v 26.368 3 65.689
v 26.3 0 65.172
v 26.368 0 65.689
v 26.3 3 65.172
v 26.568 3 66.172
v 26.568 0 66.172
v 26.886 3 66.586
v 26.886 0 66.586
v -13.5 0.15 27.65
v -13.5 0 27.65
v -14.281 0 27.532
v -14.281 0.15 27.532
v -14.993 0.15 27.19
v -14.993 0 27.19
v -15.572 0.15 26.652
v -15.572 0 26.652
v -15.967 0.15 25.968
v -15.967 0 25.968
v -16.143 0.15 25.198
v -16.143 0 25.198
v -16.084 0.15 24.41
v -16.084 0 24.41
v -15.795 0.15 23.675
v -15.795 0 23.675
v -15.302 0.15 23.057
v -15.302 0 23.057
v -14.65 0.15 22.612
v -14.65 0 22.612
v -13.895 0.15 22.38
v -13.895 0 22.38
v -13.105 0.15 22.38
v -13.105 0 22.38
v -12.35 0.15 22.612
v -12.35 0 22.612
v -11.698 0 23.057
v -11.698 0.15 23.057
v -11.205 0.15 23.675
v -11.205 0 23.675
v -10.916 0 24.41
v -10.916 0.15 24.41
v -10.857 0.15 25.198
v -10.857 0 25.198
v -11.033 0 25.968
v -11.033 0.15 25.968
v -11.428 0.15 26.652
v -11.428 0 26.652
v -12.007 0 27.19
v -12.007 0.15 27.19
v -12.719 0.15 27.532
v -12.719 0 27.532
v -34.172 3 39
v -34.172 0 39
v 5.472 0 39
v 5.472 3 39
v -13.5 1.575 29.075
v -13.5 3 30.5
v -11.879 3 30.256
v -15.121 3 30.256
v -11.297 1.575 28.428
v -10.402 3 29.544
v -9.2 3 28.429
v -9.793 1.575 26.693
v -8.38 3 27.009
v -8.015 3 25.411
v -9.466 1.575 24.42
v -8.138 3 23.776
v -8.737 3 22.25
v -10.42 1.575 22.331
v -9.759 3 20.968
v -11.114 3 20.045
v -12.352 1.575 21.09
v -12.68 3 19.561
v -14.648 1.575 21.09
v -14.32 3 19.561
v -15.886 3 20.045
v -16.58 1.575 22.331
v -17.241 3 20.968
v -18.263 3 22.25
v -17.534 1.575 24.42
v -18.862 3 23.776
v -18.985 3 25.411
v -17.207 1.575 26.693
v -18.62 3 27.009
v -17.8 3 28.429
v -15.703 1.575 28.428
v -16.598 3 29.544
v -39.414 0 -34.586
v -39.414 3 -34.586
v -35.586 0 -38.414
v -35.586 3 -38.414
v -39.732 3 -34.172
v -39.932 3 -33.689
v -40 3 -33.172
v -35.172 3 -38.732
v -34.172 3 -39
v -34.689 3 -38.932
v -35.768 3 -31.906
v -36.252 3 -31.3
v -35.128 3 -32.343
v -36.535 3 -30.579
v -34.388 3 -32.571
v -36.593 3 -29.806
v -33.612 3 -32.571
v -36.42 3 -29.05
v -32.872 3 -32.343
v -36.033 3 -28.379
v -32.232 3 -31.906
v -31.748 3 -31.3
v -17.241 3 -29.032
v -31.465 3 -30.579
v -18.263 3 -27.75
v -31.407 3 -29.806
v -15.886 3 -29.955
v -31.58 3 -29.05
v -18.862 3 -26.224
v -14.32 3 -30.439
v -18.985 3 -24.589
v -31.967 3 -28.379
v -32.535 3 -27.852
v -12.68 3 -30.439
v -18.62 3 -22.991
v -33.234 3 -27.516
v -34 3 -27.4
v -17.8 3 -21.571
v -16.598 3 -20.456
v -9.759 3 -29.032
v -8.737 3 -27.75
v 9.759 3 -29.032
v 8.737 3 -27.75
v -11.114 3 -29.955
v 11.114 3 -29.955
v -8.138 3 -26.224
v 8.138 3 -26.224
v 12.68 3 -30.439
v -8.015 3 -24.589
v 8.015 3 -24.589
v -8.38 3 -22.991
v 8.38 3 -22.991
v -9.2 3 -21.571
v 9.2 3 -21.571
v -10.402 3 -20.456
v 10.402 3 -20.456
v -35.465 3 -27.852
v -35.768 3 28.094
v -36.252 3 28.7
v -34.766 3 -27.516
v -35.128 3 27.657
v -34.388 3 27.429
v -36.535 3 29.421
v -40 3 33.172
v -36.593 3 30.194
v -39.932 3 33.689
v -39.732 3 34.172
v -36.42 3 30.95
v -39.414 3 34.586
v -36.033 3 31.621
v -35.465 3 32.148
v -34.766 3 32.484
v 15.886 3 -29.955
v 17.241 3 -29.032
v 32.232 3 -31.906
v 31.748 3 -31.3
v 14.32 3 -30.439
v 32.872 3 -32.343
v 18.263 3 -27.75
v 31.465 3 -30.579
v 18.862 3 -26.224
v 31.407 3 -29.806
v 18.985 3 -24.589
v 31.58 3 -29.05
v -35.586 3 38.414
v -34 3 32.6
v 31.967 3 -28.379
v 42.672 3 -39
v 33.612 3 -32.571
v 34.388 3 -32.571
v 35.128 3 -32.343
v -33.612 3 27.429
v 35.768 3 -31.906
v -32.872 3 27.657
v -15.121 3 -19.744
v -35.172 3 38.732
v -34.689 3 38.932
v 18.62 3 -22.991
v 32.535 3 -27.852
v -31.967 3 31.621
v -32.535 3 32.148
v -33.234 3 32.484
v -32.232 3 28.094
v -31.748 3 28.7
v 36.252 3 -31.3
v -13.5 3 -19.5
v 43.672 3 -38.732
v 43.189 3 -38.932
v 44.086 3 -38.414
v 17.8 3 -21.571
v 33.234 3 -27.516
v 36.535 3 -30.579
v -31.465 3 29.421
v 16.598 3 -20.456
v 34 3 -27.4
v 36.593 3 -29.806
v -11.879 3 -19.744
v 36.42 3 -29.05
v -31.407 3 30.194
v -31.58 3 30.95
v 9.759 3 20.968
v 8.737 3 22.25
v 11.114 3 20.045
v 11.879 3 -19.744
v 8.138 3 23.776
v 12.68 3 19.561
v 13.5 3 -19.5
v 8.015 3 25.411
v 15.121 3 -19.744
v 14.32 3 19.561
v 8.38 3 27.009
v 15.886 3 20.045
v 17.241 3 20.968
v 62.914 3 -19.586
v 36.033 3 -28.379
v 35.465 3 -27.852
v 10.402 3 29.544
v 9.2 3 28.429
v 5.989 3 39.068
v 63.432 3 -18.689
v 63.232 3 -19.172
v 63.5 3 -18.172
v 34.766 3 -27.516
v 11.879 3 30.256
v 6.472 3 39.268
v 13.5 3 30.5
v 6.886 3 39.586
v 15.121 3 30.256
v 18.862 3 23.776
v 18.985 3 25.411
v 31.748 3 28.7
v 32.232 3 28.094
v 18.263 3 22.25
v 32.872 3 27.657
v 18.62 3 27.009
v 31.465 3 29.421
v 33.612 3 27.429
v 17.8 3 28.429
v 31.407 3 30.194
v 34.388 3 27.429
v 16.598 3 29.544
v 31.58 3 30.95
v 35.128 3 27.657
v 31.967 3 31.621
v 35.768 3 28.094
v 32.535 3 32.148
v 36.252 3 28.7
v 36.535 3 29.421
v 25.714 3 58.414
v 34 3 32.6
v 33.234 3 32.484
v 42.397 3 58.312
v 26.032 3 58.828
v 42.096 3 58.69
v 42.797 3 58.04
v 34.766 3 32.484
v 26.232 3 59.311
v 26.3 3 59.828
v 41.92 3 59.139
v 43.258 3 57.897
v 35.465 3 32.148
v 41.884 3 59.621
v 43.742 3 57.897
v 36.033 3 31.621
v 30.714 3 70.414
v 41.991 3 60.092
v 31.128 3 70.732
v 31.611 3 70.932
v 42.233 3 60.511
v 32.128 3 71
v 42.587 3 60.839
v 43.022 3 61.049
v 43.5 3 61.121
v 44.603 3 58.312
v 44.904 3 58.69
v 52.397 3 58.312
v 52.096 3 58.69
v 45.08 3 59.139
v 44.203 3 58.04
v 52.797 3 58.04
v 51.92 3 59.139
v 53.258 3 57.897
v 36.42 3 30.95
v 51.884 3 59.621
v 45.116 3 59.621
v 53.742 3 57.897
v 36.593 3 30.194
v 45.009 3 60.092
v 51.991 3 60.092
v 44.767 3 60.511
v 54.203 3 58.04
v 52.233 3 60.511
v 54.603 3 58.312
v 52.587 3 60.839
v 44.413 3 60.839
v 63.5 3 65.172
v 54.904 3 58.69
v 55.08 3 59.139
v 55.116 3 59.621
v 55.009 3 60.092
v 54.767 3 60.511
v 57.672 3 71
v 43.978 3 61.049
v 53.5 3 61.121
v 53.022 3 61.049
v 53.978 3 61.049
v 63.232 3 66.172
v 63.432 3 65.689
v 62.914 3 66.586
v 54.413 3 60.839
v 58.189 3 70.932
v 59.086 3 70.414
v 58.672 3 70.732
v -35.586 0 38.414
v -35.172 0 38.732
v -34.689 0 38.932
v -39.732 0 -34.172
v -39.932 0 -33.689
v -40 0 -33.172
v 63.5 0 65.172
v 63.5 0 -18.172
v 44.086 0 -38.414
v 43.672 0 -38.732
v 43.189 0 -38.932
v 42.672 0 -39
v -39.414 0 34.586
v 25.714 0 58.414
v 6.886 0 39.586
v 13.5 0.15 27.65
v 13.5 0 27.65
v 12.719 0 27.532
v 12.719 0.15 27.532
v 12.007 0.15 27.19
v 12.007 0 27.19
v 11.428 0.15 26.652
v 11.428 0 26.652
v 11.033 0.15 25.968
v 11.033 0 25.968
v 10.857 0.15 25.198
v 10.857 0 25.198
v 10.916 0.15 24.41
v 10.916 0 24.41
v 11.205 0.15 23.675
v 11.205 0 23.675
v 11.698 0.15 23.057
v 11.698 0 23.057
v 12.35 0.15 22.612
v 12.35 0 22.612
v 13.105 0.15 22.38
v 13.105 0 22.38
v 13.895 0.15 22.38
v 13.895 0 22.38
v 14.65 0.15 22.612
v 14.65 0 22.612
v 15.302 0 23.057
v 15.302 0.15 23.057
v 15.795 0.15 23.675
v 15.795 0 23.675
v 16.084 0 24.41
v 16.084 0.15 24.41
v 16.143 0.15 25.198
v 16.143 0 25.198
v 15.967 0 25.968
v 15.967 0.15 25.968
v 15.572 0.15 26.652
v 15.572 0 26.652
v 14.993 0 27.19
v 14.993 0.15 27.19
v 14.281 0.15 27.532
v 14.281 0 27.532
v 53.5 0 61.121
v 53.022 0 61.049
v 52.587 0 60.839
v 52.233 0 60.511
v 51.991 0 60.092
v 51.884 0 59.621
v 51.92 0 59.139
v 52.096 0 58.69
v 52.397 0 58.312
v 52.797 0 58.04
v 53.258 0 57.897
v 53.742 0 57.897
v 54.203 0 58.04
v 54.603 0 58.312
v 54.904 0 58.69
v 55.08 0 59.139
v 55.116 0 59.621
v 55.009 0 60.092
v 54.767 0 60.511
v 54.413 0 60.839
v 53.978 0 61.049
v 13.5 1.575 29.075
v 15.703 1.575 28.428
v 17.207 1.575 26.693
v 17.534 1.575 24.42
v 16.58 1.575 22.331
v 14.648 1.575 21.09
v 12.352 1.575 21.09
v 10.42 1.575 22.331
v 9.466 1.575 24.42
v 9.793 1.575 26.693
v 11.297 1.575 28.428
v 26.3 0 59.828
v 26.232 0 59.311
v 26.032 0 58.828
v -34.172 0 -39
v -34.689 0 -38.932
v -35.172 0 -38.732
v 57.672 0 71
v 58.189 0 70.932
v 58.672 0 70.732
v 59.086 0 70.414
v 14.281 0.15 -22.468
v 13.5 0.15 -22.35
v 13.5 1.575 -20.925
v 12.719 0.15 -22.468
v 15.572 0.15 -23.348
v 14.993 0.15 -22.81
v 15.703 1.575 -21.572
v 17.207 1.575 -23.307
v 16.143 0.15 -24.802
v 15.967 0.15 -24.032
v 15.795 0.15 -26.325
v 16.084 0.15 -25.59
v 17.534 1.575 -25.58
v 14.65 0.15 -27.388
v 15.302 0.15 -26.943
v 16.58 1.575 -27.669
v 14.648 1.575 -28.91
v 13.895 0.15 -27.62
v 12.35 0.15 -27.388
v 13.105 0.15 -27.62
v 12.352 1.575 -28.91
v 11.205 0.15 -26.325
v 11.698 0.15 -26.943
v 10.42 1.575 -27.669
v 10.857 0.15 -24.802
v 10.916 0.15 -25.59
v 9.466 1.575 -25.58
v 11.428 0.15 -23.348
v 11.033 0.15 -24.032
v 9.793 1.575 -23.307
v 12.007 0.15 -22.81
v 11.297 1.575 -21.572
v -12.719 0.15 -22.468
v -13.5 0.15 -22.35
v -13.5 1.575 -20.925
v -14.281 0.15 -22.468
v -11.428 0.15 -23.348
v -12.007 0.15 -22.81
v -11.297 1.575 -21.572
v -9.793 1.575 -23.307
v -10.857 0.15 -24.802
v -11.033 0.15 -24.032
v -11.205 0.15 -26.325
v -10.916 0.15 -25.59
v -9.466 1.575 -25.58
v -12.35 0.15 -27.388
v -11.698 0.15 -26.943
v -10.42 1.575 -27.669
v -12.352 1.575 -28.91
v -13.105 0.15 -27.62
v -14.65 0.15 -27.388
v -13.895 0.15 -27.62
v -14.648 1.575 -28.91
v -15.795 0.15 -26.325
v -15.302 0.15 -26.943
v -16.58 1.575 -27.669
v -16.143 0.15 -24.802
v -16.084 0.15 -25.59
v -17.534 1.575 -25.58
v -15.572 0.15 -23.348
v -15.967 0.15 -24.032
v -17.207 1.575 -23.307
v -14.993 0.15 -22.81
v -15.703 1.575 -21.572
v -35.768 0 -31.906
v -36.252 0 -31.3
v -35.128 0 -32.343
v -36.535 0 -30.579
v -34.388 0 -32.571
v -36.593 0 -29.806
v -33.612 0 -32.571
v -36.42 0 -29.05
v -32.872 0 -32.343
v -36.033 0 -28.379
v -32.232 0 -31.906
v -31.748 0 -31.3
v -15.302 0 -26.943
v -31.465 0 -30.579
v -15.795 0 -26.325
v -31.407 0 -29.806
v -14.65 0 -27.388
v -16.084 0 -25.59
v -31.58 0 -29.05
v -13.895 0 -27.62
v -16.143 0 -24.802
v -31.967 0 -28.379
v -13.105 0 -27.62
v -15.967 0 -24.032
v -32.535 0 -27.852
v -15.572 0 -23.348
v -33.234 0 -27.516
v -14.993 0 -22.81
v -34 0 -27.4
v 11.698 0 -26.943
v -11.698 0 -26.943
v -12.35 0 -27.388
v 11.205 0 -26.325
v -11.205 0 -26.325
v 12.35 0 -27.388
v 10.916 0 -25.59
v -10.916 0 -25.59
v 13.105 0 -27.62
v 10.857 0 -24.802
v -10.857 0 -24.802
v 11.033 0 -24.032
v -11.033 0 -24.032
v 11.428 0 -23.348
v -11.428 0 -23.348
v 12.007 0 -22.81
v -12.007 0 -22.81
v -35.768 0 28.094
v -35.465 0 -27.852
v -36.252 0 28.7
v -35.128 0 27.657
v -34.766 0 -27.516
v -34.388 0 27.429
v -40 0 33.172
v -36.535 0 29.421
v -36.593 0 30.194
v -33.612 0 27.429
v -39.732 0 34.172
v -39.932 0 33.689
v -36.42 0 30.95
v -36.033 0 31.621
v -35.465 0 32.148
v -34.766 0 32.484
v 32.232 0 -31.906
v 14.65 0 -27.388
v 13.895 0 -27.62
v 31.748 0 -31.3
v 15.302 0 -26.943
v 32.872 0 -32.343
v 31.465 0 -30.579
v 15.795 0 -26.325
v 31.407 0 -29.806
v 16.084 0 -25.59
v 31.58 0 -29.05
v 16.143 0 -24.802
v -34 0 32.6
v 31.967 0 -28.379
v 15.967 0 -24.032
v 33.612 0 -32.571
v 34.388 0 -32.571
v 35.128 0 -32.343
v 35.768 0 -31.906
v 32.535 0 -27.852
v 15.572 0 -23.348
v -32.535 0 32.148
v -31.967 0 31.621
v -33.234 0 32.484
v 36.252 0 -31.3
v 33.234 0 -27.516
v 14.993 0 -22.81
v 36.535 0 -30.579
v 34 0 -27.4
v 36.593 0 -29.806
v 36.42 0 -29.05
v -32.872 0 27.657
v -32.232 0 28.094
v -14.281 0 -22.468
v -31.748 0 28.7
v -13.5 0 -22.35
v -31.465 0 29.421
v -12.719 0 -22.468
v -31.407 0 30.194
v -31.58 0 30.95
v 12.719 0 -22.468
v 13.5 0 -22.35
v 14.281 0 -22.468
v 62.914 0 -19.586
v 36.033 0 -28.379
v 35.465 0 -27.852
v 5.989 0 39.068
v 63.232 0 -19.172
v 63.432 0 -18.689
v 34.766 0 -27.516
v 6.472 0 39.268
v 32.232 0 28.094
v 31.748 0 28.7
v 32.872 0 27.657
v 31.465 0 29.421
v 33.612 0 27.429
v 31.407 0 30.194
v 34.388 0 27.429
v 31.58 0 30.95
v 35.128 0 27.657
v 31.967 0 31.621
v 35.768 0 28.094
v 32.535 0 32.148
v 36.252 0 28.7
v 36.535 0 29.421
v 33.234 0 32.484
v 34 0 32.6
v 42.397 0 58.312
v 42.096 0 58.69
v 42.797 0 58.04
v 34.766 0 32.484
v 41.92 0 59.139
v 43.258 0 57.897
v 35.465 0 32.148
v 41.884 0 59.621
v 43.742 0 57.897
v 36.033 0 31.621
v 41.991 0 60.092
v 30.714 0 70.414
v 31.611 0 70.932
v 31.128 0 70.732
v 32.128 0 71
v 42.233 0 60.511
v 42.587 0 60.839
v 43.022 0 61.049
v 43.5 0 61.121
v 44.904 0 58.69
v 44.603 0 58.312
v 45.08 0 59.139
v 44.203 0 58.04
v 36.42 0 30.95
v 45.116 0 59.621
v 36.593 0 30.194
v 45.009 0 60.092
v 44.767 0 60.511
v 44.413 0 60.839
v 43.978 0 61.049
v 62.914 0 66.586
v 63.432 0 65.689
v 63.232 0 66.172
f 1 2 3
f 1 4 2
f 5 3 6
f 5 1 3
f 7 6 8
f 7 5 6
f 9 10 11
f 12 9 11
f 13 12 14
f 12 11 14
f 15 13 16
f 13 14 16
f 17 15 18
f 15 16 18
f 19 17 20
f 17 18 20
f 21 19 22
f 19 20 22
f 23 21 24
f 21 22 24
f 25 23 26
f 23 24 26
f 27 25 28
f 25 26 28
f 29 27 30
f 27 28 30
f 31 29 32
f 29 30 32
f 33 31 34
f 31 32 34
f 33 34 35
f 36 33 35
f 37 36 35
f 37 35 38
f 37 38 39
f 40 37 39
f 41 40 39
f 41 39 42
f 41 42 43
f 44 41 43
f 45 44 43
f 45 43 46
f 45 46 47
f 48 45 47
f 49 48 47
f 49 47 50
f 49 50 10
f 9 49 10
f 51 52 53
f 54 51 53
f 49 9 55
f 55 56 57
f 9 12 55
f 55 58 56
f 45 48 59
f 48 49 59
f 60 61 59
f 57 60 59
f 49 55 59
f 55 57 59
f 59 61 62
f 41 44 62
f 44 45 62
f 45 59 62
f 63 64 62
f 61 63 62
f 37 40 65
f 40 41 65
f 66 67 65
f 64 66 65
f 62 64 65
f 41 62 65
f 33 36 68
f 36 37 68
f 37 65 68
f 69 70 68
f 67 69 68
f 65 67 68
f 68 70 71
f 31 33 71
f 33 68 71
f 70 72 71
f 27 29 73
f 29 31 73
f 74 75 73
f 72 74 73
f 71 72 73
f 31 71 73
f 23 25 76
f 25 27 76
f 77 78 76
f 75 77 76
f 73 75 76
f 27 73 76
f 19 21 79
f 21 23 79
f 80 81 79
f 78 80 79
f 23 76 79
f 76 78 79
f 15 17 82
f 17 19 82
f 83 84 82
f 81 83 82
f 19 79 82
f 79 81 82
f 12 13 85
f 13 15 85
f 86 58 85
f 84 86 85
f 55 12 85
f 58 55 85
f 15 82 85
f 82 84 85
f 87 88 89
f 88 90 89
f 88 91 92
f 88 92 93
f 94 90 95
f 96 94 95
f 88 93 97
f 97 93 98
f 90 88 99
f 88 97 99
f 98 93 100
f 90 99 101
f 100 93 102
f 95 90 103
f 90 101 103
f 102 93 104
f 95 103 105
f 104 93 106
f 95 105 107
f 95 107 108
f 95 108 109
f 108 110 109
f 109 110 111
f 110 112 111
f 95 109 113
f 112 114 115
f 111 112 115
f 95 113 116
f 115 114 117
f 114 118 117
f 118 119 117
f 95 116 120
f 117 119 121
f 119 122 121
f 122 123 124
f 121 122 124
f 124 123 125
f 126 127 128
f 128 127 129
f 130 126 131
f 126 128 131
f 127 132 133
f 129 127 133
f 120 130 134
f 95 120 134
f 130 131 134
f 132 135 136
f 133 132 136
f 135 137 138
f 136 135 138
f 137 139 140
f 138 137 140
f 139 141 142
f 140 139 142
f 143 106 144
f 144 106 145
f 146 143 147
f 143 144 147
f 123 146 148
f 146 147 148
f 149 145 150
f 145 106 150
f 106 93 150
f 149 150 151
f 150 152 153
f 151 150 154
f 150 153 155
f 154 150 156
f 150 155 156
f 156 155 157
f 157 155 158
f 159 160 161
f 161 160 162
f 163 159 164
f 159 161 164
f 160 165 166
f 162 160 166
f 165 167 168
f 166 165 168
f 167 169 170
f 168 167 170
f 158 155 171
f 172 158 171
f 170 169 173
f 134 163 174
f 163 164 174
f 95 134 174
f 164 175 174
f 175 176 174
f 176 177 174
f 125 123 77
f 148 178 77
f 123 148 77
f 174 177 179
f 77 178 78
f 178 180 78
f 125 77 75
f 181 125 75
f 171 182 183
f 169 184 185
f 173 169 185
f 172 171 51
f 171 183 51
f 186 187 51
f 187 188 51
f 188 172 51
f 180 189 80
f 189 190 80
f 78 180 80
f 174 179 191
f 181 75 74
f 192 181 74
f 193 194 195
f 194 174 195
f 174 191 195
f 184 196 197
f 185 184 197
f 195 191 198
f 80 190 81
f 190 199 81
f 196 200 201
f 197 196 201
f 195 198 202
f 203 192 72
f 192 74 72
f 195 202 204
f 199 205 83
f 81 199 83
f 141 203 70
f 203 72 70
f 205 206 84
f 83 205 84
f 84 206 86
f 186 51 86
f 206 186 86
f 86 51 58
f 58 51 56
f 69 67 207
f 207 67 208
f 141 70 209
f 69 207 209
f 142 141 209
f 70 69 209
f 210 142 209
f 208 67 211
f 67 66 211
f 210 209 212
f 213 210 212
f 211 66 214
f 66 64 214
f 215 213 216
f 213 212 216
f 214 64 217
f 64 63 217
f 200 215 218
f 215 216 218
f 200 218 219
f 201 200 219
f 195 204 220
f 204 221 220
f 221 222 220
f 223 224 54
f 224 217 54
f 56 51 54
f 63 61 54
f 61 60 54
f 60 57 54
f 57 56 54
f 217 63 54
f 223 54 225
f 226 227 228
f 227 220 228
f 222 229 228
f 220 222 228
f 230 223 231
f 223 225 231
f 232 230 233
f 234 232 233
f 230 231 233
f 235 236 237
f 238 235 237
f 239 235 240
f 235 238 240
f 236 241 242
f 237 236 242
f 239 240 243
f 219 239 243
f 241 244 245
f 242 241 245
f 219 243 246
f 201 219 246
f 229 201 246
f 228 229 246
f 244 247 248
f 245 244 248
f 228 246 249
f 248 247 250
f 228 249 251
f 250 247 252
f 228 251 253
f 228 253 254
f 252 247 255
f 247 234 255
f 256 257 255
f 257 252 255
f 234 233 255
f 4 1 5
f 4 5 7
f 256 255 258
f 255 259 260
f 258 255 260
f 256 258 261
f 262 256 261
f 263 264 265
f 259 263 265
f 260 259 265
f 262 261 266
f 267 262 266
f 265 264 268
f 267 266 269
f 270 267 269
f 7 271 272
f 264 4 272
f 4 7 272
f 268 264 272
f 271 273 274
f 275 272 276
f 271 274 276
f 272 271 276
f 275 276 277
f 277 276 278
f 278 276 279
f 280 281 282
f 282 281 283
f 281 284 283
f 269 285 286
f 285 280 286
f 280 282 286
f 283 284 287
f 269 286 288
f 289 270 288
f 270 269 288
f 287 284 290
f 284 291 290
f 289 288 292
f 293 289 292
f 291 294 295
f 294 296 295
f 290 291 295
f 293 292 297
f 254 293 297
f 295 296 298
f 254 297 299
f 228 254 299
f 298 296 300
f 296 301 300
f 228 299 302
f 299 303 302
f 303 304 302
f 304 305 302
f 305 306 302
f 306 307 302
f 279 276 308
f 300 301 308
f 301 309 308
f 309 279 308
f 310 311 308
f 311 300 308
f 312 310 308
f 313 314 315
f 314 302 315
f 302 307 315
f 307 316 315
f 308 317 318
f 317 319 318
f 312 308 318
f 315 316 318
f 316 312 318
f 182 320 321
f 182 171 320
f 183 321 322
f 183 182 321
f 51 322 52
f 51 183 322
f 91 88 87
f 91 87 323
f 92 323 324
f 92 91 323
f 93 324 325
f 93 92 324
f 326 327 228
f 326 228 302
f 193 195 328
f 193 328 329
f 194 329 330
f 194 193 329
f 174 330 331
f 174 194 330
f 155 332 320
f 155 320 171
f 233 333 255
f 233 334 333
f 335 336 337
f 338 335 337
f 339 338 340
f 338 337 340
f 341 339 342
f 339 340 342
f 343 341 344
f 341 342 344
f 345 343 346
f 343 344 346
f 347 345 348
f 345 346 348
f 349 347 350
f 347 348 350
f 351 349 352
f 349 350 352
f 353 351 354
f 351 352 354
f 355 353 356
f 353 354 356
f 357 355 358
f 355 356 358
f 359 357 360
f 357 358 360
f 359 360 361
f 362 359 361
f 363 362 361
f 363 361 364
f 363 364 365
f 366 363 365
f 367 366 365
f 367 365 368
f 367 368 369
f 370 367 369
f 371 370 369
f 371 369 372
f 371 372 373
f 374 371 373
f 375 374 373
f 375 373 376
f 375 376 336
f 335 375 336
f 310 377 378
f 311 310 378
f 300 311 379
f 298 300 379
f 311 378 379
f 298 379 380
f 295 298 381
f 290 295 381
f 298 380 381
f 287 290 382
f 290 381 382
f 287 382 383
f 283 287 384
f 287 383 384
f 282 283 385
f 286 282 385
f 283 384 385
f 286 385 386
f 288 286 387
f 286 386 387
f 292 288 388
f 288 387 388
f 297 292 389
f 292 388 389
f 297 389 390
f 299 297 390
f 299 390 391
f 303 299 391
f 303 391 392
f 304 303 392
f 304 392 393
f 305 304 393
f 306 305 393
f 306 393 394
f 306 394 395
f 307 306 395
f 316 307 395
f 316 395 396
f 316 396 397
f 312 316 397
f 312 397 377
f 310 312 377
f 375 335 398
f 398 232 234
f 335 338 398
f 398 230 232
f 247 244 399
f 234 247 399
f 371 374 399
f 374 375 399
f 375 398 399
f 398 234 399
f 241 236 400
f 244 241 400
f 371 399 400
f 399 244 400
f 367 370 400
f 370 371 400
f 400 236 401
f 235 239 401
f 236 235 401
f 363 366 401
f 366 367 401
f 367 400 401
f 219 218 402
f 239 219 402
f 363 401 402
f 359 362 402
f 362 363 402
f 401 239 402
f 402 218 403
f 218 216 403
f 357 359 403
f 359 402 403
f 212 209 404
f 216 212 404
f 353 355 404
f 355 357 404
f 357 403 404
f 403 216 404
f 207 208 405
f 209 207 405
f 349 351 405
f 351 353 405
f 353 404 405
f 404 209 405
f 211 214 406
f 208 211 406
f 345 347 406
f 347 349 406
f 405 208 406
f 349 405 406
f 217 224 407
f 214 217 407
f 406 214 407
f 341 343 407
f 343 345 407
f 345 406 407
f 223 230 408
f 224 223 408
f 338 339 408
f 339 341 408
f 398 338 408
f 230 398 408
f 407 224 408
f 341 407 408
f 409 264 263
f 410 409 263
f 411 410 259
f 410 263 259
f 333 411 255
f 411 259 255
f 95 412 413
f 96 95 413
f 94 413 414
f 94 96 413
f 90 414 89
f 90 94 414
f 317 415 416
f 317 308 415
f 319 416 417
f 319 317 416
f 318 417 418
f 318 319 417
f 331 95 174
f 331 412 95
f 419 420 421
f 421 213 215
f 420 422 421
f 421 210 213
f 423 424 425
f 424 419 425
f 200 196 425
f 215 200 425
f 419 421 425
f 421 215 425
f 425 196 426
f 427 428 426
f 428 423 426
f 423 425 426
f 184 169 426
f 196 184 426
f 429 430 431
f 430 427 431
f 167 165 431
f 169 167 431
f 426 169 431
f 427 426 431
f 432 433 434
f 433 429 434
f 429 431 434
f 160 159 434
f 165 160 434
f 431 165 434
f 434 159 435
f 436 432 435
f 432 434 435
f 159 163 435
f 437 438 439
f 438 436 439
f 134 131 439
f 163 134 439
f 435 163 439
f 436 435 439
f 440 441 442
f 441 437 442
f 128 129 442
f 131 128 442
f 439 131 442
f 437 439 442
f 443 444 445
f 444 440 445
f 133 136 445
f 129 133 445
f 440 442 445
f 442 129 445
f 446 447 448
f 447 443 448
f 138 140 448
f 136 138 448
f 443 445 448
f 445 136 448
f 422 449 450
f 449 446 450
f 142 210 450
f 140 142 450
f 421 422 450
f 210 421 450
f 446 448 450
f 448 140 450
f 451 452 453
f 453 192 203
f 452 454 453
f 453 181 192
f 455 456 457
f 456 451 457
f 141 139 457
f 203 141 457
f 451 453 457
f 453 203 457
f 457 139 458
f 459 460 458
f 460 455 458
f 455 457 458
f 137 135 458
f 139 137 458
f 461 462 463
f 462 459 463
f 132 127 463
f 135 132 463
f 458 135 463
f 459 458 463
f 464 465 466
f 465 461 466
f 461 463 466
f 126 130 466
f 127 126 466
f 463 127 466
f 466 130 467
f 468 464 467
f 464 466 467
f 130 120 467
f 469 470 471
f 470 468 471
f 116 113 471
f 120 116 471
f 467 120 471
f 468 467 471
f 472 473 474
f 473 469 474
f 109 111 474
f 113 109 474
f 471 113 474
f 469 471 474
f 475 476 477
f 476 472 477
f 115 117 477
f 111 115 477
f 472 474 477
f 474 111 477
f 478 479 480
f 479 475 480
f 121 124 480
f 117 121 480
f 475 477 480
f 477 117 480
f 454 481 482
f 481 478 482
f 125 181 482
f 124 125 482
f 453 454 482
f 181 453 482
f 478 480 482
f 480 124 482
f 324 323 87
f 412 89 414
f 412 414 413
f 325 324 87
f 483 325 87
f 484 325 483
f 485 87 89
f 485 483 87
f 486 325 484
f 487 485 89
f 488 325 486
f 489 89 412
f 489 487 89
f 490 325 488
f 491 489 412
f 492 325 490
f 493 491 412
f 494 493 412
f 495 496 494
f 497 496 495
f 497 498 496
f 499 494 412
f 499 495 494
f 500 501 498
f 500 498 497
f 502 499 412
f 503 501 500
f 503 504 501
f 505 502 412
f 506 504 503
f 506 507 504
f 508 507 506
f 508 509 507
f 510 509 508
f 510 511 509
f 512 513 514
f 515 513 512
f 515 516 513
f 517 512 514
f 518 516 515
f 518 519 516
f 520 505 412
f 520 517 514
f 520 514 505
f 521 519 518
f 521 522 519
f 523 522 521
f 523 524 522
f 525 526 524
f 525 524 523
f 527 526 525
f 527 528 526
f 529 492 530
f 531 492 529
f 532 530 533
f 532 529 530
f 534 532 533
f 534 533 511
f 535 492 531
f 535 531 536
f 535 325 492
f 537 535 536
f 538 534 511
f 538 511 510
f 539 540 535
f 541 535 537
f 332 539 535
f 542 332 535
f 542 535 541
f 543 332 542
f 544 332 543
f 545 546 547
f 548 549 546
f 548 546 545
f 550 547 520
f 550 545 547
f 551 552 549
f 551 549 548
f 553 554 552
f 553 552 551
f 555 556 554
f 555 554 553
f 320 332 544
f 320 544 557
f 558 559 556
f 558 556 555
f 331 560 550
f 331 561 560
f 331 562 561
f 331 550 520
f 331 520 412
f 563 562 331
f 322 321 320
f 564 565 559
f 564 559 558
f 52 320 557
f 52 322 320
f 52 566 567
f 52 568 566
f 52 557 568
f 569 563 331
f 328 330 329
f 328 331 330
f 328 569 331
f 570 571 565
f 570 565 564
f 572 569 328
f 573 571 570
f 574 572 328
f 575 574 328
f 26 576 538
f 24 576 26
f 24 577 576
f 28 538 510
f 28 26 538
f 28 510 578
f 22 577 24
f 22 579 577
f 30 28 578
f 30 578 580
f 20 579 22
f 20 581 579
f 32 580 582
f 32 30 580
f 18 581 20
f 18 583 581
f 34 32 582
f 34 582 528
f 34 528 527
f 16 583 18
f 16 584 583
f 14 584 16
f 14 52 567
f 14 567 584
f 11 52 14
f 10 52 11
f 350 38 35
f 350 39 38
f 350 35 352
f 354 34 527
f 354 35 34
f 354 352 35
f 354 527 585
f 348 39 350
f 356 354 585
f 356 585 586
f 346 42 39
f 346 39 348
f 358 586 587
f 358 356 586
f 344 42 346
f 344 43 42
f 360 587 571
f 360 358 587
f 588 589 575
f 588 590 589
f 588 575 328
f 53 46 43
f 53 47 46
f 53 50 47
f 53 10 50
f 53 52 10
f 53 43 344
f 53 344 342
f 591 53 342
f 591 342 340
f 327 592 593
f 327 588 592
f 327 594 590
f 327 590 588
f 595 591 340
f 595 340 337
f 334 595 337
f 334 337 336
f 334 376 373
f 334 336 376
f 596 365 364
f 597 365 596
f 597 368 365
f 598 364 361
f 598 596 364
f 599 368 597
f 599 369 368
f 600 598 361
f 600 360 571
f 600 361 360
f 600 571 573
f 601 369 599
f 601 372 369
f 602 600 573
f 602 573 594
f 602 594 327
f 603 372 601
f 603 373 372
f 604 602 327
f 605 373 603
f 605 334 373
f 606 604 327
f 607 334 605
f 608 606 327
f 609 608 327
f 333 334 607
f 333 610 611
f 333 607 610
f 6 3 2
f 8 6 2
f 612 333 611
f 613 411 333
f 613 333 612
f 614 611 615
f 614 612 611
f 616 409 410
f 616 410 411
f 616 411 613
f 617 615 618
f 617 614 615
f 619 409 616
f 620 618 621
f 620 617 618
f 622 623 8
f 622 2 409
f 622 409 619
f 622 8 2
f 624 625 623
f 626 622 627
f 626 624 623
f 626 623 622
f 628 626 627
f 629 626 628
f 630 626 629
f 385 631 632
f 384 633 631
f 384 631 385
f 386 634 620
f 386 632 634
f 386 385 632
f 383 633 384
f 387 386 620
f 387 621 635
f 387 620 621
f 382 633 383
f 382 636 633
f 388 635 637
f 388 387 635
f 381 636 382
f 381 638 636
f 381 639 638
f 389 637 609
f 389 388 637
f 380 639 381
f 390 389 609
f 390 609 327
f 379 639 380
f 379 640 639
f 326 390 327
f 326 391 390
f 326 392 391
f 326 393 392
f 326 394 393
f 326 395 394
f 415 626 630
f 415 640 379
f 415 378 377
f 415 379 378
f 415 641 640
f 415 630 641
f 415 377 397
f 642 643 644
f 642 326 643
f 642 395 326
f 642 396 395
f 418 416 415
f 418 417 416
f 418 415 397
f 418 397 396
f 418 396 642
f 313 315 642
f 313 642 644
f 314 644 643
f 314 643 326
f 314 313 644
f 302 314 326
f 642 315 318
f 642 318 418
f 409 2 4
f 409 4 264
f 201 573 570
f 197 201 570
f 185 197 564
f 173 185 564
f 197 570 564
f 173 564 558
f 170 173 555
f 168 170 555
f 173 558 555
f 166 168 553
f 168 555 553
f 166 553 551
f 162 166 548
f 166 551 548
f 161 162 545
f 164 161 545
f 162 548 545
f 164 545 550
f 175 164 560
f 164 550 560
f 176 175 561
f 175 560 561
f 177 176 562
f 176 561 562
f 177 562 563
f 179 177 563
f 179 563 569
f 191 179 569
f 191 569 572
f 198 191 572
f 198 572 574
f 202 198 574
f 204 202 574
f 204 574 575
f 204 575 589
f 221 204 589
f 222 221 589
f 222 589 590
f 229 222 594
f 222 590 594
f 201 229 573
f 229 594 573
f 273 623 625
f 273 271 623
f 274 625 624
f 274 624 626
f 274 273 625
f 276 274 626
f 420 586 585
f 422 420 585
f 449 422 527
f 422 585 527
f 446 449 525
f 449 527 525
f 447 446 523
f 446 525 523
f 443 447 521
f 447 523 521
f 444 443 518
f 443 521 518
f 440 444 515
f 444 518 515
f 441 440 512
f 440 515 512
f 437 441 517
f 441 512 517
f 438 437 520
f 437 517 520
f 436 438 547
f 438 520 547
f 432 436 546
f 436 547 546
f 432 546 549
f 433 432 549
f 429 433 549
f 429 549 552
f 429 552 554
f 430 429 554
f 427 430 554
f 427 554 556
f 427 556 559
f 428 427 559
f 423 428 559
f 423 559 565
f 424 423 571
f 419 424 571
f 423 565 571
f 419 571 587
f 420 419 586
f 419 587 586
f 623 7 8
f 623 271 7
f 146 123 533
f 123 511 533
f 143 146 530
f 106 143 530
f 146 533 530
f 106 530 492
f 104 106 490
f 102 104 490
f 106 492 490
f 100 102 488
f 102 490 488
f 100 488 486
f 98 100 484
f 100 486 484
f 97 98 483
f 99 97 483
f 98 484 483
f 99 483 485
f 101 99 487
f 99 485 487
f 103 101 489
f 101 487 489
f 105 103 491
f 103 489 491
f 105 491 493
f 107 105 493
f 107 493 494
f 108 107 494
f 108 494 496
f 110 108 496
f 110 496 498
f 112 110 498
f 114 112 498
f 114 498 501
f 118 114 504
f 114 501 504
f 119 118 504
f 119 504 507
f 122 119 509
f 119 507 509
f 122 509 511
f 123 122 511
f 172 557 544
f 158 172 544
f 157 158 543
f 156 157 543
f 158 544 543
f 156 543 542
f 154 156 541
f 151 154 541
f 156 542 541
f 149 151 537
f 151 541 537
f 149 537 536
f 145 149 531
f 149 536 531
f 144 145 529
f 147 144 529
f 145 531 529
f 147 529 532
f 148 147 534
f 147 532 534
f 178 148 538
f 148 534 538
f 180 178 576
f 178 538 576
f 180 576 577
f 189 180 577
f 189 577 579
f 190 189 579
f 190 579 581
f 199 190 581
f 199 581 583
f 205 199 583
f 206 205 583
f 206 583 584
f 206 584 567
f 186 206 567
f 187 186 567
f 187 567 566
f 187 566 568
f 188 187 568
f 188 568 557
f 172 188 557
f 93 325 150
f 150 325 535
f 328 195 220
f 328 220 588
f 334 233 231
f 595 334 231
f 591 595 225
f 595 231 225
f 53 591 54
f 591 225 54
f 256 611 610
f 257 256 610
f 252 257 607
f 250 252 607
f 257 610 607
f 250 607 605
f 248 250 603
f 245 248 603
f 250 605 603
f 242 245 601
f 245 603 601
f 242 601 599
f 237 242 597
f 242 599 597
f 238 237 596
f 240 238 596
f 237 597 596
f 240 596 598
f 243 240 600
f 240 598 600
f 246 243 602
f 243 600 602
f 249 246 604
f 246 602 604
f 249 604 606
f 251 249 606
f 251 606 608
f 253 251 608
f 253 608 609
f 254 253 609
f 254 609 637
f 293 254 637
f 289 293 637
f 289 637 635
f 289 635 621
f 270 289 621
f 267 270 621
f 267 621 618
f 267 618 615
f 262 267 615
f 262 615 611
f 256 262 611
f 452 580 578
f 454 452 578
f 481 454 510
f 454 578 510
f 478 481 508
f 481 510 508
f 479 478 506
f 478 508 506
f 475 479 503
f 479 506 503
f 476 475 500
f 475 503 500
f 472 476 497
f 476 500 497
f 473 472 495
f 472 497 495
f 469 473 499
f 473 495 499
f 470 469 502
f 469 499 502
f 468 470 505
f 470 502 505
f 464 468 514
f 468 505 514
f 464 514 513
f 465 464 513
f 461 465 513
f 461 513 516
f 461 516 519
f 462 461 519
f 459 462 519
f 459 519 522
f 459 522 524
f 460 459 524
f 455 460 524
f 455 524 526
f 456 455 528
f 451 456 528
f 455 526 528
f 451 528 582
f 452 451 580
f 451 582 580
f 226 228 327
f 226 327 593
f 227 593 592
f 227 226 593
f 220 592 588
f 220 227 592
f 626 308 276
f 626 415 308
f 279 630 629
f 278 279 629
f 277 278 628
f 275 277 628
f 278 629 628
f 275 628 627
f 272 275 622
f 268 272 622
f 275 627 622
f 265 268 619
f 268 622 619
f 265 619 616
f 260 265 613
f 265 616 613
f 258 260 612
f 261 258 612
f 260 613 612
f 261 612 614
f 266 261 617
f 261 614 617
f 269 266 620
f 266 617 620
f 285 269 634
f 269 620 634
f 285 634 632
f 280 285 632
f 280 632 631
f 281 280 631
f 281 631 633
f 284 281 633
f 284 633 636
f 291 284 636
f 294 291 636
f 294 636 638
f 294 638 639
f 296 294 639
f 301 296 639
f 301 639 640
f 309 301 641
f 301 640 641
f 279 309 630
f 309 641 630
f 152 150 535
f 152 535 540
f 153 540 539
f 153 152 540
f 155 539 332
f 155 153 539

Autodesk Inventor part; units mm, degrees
ref_plane "YZ Plane" through (0, 0, 0) normal (1, 0, 0) x (0, 1, 0)
ref_plane "XZ Plane" through (0, 0, 0) normal (0, 1, 0) x (-1, 0, 0)
ref_plane "XY Plane" through (0, 0, 0) normal (0, 0, 1) x (1, 0, 0)
sketch "スケッチ1" plane through (0, 0, 0) normal (0, 1, 0) x (-1, 0, 0)
  line L0 (-40, -39) -> (40, -39)
  line L1 (40, -39) -> (40, 39)
  line L2 (40, 39) -> (-40, 39)
  line L3 (-40, 39) -> (-40, -39)
  line L4 (-40, -39) -> (40, 39) construction
  line L5 (40, -39) -> (-40, 39) construction
  point P0 (0, 0)
  dimension "d0" = 80
  dimension "d1" = 78
extrude "押し出し1" add sketch "スケッチ1" along normal blind 3
sketch "スケッチ2" plane through (0, 3, 0) normal (0, 1, 0) x (1, 0, 0)
  line L0 (34, 30) -> (-34, 30)
  line L1 (-34, 30) -> (-34, -30)
  line L2 (-34, -30) -> (34, -30)
  line L3 (34, -30) -> (34, 30)
  line L4 (34, 30) -> (-34, -30) construction
  line L5 (-34, 30) -> (34, -30) construction
  point P0 (0, 0)
  dimension "d4" = 68
  dimension "d5" = 60
hole "穴1" at (-34, 3, 30) at (34, 3, 30) at (34, 3, -30) at (-34, 3, -30) direction (0, -1, 0) diameter 5.2 depth 8 tip angle 118
sketch "スケッチ3" plane through (0, 3, 0) normal (0, 1, 0) x (1, 0, 0)
  line L0 (13.5, 25) -> (-13.5, 25)
  line L1 (-13.5, 25) -> (-13.5, -25)
  line L2 (-13.5, -25) -> (13.5, -25)
  line L3 (13.5, -25) -> (13.5, 25)
  line L4 (13.5, 25) -> (-13.5, -25) construction
  line L5 (-13.5, 25) -> (13.5, -25) construction
  point P0 (0, 0)
  dimension "d13" = 27
  dimension "d14" = 50
hole "穴2" at (-13.5, 3, 25) at (13.5, 3, 25) at (13.5, 3, -25) at (-13.5, 3, -25) direction (0, -1, 0) diameter 5.3 depth 8 tip angle 118 countersink diameter 11 countersink angle 90
sketch "スケッチ4" plane through (0, 0, 0) normal (0, -1, 0) x (1, 0, 0)
  line L0 (40, -39) -> (-40, -39) projected
  line L1 (26.3, -39) -> (63.5, -39)
  line L2 (63.5, -39) -> (63.5, 71)
  line L3 (63.5, 71) -> (26.3, 71)
  line L4 (26.3, 71) -> (26.3, -39)
  circle A0 centre (13.5, -25) radius 2.65 projected
  circle A1 centre (-13.5, 25) radius 2.65 projected
  circle A2 centre (13.5, 25) radius 2.65 projected
  circle A3 centre (-13.5, -25) radius 2.65 projected
  circle A4 centre (34, -30) radius 2.6 projected
  circle A5 centre (-34, 30) radius 2.6 projected
  circle A6 centre (34, 30) radius 2.6 projected
  circle A7 centre (-34, -30) radius 2.6 projected
  line L5 (-40, -39) -> (-40, 39) projected
  line L6 (40, -39) -> (-40, -39) projected
  line L7 (40, 39) -> (40, -39) projected
  line L8 (-40, 39) -> (40, 39) projected
  point P0 (0, 0)
  point P1 (26.3, 39)
  dimension "d23" = 110
  dimension "d24" = 50
extrude "押し出し2" add sketch "スケッチ4" against normal up to surface (3 mm away) contours L7 L8 L4 L3 L2 L1
sketch "スケッチ5" plane through (0, 3, 0) normal (0, 1, 0) x (1, 0, 0)
  circle A0 centre (13.5, 25) radius 5.5 projected
  circle A1 centre (-13.5, -25) radius 5.5 projected
  circle A2 centre (13.5, -25) radius 5.5 projected
  circle A3 centre (-13.5, 25) radius 5.5 projected
  circle A4 centre (34, 30) radius 2.6 projected
  circle A5 centre (-34, -30) radius 2.6 projected
  circle A6 centre (34, -30) radius 2.6 projected
  circle A7 centre (-34, 30) radius 2.6 projected
  line L0 (63.5, 39) -> (63.5, -71) projected
  line L1 (-40, 39) -> (63.5, 39) projected
  line L2 (-40, 39) -> (-40, -39) projected
  line L3 (-40, -39) -> (26.3, -39) projected
  line L4 (26.3, -71) -> (26.3, -39) projected
  line L5 (63.5, -71) -> (26.3, -71) projected
  point P0 (0, 0)
  point P1 (53.5, -59.5)
  point P2 (43.5, -59.5)
  dimension "d28" = 10
  dimension "d29" = 11.5
  dimension "d30" = 10
hole "穴3" at (53.5, 3, 59.5) at (43.5, 3, 59.5) direction (0, -1, 0) diameter 3.242 depth 11.8 tip angle 118 thread size "M4x0.7" class "6H" standard "ISO Metric profile"
chamfer "面取り1" distance 20 angle 45 2 edges at (63.5, 1.5, -39) (26.3, 1.5, 39)
chamfer "面取り2" distance 5 angle 45 4 edges at (63.5, 1.5, 71) (26.3, 1.5, 71) (-40, 1.5, 39) (-40, 1.5, -39)
fillet "フィレット3" radius 2 12 edges at (63.5, 1.5, 66) (58.5, 1.5, 71) (31.3, 1.5, 71) (26.3, 1.5, 66) (26.3, 1.5, 59) (6.3, 1.5, 39) (-35, 1.5, 39) (-40, 1.5, 34) (-40, 1.5, -34) (-35, 1.5, -39) (63.5, 1.5, -19) (43.5, 1.5, -39)
properties part number "CCM_Mount_B"
